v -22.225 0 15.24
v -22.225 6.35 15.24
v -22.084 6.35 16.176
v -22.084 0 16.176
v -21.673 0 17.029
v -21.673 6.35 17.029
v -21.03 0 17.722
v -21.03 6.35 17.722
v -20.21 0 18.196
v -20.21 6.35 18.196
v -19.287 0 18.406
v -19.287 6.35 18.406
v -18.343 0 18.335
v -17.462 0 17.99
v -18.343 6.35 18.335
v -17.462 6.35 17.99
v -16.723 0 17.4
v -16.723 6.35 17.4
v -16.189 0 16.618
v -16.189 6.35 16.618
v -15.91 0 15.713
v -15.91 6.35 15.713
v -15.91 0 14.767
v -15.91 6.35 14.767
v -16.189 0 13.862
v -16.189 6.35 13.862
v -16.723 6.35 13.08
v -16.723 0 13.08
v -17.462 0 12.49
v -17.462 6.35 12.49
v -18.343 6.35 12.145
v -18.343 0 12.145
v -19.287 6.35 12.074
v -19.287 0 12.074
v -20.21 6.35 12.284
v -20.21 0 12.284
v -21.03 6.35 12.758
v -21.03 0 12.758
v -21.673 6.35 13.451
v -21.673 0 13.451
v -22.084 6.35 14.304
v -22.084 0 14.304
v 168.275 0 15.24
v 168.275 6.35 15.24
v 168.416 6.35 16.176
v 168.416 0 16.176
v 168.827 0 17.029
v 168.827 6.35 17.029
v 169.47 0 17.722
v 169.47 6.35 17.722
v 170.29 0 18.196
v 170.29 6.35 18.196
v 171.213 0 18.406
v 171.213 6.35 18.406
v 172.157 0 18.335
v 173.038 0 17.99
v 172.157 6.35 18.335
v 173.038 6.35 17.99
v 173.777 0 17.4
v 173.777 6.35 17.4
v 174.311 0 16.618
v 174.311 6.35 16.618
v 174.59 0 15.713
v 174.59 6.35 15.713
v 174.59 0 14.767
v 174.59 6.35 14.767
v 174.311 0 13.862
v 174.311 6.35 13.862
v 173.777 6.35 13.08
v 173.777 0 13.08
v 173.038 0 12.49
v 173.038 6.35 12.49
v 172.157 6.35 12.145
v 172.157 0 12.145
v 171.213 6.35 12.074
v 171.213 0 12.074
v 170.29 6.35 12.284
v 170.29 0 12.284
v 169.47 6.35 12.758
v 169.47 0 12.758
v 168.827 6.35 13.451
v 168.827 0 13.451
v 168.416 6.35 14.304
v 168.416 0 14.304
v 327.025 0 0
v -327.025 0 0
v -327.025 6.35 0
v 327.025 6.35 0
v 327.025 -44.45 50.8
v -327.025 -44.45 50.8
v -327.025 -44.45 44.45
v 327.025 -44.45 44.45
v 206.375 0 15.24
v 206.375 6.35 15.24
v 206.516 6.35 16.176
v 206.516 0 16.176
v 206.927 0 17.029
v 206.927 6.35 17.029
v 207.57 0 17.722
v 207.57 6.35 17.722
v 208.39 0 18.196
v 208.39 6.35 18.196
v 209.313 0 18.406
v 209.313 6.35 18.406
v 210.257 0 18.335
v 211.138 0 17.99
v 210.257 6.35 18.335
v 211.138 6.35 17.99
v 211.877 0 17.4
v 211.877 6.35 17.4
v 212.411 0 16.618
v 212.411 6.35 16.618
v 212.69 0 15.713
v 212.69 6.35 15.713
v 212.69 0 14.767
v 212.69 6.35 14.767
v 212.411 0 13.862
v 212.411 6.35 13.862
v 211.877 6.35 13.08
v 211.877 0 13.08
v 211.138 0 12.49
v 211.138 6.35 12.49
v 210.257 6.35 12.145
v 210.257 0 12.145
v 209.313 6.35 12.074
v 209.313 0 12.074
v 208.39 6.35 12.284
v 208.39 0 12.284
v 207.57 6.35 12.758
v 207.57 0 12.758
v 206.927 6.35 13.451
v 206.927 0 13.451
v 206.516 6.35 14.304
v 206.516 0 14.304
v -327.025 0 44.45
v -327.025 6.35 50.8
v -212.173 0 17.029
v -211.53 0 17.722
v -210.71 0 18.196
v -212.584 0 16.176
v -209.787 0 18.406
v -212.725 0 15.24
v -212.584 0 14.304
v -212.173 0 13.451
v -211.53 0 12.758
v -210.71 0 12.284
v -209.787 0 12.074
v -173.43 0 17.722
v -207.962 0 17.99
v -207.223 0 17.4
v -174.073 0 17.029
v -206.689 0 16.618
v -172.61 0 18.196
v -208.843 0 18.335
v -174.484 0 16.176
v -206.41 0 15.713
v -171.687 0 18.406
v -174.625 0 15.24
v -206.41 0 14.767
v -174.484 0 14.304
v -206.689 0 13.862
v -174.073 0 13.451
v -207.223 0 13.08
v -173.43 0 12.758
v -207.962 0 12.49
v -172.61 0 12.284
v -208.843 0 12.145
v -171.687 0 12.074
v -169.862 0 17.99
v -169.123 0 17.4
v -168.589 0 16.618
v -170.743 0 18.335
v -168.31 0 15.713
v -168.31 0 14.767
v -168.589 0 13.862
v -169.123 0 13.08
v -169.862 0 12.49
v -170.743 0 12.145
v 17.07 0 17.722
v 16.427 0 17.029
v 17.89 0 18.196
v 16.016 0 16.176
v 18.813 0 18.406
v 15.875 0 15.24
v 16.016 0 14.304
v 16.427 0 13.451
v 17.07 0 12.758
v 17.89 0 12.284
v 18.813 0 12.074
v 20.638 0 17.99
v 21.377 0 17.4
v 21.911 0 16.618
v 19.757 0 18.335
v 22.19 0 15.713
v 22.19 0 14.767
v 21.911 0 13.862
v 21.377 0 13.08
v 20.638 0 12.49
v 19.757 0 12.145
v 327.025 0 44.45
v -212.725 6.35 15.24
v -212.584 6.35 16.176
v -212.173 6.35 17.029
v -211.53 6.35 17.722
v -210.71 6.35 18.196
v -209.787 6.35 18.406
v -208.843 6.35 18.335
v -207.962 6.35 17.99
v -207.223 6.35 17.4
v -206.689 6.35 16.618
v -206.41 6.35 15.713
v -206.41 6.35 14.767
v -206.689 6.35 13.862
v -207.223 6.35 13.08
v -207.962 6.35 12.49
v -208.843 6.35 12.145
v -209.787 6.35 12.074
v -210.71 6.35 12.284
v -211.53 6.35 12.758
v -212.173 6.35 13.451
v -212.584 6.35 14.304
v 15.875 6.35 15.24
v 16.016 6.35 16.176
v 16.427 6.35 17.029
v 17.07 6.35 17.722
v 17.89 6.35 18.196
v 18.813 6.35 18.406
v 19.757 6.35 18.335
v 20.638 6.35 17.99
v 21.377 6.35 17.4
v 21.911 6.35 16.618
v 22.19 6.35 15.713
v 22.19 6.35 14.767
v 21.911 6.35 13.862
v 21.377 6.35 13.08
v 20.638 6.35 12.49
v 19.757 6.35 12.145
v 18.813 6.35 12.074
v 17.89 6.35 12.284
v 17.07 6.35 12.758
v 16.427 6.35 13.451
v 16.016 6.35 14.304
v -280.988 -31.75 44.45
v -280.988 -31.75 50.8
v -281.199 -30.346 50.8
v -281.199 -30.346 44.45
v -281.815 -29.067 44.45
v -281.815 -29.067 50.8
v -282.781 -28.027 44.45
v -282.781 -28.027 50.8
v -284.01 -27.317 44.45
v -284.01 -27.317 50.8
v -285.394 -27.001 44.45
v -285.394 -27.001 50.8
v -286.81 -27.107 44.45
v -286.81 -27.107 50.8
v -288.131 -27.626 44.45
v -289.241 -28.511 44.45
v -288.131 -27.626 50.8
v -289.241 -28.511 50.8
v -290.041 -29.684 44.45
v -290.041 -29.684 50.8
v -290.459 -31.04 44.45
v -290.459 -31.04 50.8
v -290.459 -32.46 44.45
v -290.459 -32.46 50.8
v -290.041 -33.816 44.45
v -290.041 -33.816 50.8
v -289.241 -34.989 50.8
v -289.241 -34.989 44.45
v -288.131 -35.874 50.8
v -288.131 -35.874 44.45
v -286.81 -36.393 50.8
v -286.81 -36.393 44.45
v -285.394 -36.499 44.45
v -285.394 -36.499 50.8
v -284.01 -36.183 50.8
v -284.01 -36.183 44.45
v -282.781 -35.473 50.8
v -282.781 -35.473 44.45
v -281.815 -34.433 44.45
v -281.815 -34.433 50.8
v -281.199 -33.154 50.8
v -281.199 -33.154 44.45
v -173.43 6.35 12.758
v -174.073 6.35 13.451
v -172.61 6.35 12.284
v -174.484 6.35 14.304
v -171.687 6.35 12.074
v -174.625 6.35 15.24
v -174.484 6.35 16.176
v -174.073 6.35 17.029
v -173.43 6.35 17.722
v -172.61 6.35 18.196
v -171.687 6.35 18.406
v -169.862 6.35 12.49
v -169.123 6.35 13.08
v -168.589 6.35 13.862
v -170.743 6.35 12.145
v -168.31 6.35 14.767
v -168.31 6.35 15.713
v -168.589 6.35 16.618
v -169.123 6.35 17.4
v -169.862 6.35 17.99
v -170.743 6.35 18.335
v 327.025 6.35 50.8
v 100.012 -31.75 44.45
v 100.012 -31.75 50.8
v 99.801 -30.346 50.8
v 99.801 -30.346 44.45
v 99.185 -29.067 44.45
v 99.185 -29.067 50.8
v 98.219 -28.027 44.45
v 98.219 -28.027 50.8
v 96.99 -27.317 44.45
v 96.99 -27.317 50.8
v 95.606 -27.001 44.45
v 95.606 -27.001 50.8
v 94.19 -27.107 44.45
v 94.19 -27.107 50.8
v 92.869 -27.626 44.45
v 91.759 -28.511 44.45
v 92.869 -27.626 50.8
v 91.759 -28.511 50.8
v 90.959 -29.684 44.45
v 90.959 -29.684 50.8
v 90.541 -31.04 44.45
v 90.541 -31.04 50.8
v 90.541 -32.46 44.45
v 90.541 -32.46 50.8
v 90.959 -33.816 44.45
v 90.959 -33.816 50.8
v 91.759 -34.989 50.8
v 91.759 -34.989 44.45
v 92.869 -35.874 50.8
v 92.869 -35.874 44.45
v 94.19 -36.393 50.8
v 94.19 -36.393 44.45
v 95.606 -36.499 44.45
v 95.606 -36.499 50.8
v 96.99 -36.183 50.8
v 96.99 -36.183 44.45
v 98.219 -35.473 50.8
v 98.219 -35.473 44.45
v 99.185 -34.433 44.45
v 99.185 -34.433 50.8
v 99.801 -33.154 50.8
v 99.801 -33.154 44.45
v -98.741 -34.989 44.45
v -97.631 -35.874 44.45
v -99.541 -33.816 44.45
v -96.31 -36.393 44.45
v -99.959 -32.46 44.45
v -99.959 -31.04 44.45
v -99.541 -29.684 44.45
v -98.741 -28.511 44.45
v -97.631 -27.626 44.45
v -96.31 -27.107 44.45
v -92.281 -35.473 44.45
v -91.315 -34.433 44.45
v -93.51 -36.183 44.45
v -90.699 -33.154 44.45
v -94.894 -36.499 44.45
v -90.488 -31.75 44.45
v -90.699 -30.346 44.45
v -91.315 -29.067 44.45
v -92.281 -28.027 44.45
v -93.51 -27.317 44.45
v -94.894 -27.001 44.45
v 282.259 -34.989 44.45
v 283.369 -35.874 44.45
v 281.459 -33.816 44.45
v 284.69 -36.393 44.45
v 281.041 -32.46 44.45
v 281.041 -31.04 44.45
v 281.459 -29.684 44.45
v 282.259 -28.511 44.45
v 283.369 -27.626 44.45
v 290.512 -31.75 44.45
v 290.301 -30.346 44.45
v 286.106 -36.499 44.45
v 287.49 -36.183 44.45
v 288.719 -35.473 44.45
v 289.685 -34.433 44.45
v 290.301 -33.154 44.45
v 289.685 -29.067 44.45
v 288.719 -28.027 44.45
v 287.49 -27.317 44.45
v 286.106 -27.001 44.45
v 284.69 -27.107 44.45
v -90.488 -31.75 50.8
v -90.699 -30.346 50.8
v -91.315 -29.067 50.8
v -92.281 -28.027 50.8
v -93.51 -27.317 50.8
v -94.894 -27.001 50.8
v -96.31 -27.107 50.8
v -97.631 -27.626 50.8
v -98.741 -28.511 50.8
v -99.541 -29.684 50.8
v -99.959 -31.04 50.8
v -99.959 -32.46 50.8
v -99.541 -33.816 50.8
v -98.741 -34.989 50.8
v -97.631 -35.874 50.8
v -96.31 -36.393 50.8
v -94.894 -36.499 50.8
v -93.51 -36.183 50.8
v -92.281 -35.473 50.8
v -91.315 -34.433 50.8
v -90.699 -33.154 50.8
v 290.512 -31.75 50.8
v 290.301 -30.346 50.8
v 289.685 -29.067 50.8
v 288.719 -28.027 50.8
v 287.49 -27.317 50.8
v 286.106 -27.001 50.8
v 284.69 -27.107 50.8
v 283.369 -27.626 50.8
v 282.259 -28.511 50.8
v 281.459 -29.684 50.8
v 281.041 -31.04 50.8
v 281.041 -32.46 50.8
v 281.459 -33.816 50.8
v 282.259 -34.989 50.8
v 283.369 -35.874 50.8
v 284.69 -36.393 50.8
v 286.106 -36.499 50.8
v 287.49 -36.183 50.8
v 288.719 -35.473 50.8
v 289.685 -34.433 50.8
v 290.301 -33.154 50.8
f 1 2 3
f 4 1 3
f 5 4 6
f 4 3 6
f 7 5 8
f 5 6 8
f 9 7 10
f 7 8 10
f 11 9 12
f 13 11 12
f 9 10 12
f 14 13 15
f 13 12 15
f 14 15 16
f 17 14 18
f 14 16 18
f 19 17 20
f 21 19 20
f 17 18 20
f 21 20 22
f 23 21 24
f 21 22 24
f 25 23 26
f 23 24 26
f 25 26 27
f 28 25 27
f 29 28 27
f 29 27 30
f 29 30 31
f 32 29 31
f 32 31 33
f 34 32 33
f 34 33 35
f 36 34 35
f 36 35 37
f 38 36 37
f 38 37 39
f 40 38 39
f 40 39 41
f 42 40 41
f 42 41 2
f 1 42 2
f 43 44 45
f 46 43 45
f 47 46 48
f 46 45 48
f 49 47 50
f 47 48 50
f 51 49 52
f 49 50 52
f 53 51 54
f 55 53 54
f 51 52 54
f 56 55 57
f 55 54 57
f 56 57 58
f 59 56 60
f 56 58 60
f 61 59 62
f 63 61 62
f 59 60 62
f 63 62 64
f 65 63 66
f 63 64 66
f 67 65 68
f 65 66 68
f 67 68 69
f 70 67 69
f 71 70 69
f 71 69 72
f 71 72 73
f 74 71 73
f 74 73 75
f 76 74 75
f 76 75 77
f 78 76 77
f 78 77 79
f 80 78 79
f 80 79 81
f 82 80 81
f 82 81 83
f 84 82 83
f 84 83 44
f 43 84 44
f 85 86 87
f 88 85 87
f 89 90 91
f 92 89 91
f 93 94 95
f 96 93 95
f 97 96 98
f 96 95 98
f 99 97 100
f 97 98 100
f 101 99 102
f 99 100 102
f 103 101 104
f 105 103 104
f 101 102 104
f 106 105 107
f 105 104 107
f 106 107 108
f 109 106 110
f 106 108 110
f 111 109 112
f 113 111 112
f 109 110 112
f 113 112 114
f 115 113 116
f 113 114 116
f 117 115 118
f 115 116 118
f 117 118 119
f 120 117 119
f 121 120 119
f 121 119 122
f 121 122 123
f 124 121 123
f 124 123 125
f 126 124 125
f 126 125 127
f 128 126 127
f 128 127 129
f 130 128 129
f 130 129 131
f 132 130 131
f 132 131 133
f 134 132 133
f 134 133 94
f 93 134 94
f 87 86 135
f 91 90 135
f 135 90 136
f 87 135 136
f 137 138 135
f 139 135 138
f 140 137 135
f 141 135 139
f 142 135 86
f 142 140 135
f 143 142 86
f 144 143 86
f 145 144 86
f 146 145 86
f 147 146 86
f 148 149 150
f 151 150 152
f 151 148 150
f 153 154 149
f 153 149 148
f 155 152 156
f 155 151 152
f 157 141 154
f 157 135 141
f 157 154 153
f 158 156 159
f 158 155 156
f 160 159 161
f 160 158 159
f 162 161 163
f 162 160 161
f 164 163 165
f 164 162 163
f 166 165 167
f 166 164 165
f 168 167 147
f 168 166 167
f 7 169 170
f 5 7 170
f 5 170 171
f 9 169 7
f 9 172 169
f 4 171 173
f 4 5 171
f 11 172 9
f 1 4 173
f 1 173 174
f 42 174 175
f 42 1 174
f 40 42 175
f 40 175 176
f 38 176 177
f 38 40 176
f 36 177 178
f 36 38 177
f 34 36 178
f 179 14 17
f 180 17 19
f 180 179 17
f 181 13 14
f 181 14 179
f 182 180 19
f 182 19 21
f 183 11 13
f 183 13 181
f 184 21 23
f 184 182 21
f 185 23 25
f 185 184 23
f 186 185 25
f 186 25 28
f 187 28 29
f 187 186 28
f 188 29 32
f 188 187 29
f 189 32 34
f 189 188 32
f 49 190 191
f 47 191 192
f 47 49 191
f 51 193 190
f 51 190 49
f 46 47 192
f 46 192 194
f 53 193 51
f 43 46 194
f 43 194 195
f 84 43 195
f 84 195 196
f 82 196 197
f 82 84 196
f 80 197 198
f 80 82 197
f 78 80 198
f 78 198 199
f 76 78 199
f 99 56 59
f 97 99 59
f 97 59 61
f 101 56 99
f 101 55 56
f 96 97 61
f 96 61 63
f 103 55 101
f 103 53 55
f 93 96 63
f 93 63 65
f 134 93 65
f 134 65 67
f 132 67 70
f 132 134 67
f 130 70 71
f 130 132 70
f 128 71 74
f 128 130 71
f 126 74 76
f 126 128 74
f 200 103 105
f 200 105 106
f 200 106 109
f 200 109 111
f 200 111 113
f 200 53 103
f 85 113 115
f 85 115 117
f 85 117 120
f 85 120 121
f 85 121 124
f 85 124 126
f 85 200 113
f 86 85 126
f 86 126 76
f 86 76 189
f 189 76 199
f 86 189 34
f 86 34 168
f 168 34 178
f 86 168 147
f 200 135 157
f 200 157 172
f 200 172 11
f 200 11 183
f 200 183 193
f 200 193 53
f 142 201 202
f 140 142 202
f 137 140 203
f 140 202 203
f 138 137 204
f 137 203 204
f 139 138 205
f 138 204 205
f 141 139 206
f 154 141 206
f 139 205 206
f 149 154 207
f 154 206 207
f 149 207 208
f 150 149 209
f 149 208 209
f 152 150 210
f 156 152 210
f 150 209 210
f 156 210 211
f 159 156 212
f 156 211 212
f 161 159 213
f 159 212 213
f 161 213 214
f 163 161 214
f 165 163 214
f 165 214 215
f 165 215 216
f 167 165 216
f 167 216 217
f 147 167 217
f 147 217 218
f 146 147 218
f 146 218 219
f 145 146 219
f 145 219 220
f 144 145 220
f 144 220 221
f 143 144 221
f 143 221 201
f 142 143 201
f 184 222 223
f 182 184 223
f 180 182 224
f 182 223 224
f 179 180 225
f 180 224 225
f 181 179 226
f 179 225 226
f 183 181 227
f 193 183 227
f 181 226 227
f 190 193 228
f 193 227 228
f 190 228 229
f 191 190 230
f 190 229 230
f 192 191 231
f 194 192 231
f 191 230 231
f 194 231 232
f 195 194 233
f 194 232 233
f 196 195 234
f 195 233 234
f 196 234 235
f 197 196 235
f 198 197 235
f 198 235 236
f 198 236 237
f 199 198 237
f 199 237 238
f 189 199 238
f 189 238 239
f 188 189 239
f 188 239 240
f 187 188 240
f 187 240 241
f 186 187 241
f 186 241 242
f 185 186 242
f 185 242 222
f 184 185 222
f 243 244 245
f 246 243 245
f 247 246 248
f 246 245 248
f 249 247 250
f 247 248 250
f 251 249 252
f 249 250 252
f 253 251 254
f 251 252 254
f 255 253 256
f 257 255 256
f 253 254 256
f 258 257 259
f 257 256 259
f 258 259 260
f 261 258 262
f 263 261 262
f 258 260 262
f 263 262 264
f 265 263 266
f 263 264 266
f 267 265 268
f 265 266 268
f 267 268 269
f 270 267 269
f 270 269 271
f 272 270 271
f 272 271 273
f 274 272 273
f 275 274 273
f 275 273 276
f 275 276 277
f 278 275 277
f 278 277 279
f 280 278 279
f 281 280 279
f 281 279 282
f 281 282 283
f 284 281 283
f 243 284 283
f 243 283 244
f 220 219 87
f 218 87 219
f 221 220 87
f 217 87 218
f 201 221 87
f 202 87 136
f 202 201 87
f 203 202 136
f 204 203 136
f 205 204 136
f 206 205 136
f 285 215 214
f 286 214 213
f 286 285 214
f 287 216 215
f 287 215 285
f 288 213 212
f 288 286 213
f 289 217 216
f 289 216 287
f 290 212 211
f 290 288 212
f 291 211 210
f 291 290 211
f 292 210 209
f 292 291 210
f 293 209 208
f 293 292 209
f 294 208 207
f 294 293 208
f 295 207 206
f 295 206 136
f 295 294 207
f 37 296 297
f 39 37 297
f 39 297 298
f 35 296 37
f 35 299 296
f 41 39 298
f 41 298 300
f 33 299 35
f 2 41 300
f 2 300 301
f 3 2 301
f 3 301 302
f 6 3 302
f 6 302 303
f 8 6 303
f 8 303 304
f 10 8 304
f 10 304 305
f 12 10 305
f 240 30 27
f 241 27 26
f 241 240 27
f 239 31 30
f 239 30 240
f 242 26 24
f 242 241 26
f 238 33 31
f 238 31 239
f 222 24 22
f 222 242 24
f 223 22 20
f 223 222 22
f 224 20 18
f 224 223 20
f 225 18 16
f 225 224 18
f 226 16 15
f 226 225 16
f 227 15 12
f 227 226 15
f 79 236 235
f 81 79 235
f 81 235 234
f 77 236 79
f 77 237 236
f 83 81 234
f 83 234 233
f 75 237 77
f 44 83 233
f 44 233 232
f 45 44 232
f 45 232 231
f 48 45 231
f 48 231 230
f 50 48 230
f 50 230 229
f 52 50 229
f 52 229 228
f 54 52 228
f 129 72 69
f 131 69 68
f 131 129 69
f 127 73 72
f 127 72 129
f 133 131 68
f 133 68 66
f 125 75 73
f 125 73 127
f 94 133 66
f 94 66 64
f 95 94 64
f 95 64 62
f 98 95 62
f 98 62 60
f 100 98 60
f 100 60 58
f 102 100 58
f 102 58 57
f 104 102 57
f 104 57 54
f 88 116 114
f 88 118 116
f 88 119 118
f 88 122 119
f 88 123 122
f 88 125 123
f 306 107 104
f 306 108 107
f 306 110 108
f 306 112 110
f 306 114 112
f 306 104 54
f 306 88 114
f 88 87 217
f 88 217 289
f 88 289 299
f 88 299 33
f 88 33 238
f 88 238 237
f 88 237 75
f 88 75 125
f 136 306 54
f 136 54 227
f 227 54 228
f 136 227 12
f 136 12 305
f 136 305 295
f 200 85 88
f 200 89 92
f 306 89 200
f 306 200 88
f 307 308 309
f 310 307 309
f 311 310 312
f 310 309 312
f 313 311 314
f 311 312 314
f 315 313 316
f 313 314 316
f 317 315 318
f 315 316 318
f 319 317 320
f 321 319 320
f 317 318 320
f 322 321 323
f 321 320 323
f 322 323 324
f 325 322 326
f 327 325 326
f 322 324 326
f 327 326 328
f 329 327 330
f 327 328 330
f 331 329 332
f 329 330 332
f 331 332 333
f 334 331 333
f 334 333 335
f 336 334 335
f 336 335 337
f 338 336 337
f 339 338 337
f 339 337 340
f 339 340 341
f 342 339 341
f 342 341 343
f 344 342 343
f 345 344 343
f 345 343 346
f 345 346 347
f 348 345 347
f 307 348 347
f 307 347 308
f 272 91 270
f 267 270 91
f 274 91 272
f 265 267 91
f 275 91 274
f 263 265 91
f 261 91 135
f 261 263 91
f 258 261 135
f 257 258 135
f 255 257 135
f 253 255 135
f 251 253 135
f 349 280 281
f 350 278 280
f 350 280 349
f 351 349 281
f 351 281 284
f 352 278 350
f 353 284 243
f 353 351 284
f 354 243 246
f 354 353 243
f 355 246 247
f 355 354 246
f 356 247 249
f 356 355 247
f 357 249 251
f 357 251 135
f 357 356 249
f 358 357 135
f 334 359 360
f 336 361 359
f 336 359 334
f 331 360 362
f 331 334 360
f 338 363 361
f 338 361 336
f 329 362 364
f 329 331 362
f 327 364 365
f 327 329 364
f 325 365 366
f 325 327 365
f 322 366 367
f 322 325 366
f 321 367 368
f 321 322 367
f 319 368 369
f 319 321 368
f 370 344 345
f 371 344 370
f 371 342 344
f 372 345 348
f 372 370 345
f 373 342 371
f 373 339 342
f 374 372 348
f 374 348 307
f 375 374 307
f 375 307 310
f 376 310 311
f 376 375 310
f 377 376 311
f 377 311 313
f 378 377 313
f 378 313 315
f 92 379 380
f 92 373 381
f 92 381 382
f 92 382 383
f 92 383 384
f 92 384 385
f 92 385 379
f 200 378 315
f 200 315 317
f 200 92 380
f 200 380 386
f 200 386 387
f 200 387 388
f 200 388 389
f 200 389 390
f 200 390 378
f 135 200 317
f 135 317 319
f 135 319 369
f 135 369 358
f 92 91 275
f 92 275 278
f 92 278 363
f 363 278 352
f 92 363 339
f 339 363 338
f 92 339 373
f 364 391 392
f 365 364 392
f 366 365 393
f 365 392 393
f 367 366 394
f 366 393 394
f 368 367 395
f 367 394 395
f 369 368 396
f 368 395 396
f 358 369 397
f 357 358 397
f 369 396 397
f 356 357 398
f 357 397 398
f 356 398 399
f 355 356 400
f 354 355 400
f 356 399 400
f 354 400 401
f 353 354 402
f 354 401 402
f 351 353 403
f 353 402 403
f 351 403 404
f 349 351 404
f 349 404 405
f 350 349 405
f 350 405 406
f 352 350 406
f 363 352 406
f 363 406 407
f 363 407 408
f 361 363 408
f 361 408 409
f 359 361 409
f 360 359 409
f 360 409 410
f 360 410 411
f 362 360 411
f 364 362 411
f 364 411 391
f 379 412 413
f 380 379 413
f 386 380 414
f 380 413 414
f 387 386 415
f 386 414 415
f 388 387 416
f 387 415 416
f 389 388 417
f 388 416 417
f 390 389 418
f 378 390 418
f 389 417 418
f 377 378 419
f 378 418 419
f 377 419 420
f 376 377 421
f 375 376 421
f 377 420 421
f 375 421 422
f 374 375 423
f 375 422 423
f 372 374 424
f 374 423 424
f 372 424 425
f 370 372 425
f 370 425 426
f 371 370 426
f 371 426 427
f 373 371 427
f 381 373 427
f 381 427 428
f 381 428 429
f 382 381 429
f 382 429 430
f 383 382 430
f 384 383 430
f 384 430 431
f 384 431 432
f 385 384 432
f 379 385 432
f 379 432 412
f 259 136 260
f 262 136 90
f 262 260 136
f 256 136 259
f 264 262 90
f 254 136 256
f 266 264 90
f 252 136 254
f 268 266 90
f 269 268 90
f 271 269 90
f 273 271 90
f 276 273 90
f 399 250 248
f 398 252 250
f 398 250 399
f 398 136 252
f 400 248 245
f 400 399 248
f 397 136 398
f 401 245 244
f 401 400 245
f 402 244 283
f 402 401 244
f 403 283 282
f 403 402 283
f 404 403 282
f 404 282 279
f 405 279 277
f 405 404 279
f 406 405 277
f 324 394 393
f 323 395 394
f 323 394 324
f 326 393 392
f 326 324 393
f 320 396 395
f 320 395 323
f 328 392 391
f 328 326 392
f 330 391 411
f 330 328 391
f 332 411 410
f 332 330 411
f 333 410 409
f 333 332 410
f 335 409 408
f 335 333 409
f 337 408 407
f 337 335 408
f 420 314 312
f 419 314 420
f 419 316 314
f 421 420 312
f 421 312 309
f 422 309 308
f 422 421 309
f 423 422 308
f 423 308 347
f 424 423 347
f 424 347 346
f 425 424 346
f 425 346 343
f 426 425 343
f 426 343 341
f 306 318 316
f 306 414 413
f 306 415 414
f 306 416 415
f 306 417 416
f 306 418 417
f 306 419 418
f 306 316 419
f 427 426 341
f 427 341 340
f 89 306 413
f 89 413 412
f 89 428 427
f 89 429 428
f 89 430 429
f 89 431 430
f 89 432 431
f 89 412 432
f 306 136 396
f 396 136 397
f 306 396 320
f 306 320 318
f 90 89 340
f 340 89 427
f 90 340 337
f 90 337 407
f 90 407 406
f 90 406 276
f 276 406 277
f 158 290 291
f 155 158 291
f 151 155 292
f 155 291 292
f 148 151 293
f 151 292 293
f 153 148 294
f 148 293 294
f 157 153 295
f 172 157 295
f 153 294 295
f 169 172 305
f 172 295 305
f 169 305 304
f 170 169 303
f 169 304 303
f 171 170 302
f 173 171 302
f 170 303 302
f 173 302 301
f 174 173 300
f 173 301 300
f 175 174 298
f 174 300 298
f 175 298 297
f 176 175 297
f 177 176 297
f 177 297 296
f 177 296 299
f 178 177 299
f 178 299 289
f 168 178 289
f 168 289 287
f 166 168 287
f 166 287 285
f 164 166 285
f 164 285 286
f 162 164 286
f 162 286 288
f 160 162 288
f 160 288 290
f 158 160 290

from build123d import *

# Parameters (mm, degrees)
F1_DEPTH      = 327.025
F2_R          = 4.7625
F3_DEPTH      = 50.801
F4_R          = 3.175
F5_DEPTH      = 50.801
F5_DEPTH_BACK = 697


# Not quite as in the source:
# - an extrude ends at something that could not be found from the text; its depth is read off the source's solid


with BuildPart() as f1:
    # F0 (on Right) → F1 (new body, symmetric)
    with BuildSketch(Plane.YZ):
        Polygon((0, 44.45), (0, 0), (6.35, 0), (6.35, 50.8), (-44.45, 50.8), (-44.45, 44.45), align=None)
    extrude(amount=F1_DEPTH, both=True)

    # F2 (on face) → F3 (cut, through all)
    with BuildSketch(Plane.XY.offset(50.8)):
        with Locations((-285.75, -31.75)):
            Circle(F2_R)
        with Locations((-95.25, -31.75)):
            Circle(F2_R)
        with Locations((95.25, -31.75)):
            Circle(F2_R)
        with Locations((285.75, -31.75)):
            Circle(F2_R)
    extrude(amount=-F3_DEPTH, mode=Mode.SUBTRACT)

    # F4 (on face) → F5 (cut, two sides)
    with BuildSketch(Plane(origin=(0, 6.35, 0), x_dir=(-1, 0, 0), z_dir=(0, 1, 0))) as f5_sk:
        with Locations((209.55, 15.24)):
            Circle(F4_R)
        with Locations((171.45, 15.24)):
            Circle(F4_R)
        with Locations((19.05, 15.24)):
            Circle(F4_R)
        with Locations((-19.05, 15.24)):
            Circle(F4_R)
        with Locations((-171.45, 15.24)):
            Circle(F4_R)
        with Locations((-209.55, 15.24)):
            Circle(F4_R)
    extrude(amount=-F5_DEPTH, mode=Mode.SUBTRACT)
    extrude(f5_sk.sketch, amount=F5_DEPTH_BACK, mode=Mode.SUBTRACT)


solid = f1.part
